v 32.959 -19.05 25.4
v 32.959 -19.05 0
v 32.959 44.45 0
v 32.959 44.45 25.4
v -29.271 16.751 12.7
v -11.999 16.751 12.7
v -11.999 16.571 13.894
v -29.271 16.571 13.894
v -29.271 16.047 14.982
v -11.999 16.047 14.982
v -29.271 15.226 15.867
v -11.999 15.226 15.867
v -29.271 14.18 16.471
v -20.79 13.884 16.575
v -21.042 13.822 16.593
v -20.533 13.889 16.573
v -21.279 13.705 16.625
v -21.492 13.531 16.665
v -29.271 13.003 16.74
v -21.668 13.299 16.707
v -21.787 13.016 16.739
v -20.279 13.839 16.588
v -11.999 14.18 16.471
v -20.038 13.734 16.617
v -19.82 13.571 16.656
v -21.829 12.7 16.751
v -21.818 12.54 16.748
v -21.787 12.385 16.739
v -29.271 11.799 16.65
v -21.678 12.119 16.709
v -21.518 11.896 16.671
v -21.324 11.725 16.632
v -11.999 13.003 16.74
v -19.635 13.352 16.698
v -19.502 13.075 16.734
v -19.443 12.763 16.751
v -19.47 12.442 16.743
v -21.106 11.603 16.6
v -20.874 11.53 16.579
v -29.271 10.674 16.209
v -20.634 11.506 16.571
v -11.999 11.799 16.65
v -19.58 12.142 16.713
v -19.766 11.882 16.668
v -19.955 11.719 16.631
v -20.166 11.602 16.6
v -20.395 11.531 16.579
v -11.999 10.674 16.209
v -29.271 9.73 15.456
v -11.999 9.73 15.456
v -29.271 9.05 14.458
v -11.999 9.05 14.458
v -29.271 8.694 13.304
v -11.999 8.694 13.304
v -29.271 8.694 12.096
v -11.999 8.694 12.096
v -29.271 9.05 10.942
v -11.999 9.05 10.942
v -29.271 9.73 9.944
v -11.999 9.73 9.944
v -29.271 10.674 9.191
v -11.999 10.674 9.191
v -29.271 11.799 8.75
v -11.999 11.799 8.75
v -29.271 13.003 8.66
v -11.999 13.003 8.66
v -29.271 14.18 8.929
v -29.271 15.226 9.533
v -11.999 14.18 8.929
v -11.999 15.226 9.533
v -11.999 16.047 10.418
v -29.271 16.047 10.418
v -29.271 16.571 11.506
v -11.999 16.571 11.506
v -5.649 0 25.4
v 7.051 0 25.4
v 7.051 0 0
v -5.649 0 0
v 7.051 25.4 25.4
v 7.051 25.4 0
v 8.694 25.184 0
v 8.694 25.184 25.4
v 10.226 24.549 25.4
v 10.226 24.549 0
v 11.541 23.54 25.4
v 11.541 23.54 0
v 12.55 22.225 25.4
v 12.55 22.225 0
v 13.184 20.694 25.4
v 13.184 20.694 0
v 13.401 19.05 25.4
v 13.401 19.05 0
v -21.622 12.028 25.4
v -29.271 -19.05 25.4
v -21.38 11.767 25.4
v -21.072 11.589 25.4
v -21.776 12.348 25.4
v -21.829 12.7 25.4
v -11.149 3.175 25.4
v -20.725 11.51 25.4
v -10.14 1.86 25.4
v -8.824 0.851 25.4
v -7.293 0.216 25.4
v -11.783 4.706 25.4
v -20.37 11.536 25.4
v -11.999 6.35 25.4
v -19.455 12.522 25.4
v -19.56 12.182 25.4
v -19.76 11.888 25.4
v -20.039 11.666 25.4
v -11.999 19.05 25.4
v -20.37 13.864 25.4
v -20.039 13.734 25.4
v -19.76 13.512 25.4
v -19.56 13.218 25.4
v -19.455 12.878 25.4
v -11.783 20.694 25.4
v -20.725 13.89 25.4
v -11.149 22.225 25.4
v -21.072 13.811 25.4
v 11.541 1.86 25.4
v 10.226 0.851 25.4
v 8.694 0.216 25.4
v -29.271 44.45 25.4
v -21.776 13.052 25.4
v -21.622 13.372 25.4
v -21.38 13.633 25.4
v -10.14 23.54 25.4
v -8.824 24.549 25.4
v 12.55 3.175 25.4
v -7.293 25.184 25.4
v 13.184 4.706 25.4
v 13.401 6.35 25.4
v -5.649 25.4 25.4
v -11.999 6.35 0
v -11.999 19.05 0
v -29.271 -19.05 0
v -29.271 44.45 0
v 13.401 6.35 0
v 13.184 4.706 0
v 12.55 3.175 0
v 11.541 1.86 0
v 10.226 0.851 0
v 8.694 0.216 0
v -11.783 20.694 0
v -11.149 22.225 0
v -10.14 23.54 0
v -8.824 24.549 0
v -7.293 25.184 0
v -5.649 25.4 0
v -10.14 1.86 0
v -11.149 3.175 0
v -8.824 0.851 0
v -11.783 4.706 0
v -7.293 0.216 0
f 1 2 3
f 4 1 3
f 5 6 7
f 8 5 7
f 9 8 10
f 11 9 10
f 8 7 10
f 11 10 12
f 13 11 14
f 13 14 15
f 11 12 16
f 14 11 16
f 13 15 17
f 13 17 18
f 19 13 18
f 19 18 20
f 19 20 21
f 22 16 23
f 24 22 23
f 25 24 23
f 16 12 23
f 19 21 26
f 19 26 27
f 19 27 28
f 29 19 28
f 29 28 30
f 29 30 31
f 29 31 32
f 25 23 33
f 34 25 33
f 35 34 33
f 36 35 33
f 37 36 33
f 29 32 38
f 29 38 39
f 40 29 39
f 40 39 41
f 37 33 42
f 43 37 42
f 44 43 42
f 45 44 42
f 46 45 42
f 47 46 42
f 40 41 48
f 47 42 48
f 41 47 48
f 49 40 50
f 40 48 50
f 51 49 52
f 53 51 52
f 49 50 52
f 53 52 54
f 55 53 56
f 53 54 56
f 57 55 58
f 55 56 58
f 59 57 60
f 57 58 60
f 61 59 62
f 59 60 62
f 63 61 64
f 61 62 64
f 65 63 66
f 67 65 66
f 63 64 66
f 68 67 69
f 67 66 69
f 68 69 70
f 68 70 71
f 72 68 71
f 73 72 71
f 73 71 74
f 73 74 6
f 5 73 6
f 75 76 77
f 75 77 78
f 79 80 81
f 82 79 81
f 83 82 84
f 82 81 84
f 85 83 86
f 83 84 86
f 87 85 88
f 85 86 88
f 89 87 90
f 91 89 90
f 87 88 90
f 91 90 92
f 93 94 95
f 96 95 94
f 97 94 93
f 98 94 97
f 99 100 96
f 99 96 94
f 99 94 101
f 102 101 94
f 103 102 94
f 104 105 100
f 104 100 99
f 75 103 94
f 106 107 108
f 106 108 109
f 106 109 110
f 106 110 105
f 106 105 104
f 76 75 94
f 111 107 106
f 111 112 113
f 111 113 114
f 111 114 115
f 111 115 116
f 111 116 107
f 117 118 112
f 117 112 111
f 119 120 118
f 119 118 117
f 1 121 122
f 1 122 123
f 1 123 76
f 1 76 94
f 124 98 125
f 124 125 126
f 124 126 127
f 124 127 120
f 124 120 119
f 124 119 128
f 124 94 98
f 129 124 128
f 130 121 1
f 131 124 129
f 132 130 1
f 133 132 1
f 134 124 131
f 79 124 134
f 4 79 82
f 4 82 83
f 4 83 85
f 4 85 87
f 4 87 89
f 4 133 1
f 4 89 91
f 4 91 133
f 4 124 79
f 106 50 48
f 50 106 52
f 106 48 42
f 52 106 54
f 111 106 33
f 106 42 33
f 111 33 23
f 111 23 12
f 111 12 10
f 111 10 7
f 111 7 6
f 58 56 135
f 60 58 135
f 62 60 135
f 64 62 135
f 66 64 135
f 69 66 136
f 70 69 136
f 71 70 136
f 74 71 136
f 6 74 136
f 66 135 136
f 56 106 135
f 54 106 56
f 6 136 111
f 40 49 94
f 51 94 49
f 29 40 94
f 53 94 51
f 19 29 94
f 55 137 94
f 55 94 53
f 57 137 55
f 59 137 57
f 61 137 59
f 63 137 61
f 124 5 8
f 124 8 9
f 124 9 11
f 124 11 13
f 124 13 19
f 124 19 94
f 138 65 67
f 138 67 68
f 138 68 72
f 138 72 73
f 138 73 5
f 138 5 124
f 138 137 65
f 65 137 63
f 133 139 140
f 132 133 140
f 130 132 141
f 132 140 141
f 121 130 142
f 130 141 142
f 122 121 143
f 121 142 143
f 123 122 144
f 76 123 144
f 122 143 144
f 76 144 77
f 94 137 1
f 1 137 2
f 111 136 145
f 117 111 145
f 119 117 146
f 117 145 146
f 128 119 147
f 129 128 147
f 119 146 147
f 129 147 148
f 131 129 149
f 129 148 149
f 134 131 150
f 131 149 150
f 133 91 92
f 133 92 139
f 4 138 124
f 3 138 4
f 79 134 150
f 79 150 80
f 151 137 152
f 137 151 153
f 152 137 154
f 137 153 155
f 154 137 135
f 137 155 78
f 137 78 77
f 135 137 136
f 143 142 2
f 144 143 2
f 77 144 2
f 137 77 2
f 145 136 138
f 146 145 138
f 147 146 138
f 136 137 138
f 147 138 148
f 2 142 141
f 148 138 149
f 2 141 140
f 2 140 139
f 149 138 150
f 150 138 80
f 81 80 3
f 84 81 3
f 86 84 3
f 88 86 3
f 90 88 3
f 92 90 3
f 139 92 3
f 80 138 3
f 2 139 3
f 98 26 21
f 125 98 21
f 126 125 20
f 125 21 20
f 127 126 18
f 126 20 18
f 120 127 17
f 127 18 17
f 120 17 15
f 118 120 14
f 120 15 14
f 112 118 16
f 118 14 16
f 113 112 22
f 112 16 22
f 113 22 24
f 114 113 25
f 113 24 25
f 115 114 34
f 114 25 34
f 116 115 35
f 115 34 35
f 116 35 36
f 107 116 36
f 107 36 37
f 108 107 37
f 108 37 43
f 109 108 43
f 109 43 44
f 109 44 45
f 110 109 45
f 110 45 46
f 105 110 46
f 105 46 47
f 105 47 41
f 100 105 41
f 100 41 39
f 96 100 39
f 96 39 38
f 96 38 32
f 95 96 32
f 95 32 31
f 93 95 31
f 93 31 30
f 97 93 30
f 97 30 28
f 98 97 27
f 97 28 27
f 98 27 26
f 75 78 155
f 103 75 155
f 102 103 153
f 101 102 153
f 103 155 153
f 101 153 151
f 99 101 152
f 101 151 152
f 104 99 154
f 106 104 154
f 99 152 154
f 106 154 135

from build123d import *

# Parameters (mm, degrees)
F0_W     = 62.23
F0_H     = 63.5
F1_DEPTH = 25.4
F3_D     = 8.1026
F3_DEPTH = 20.32
F5_D     = 2.3876
F5_DEPTH = 12.7


with BuildPart() as f1:
    # F0 (on Top) → F1 (new body)
    with BuildSketch(Plane.XY):
        with Locations((1.843547, 12.7)):
            Rectangle(F0_W, F0_H)
        with BuildLine():
            ThreePointArc((-11.999453, 19.05), (-10.139581, 23.540128), (-5.649453, 25.4))
            Line((-5.649453, 25.4), (7.050547, 25.4))
            ThreePointArc((7.050547, 25.4), (11.540676, 23.540128), (13.400547, 19.05))
            Line((13.400547, 19.05), (13.400547, 6.35))
            ThreePointArc((13.400547, 6.35), (11.540676, 1.859872), (7.050547, 0))
            Line((7.050547, 0), (-5.649453, 0))
            ThreePointArc((-5.649453, 0), (-10.139581, 1.859872), (-11.999453, 6.35))
            Line((-11.999453, 6.35), (-11.999453, 19.05))
        make_face(mode=Mode.SUBTRACT)
    extrude(amount=F1_DEPTH)

    # F3
    with Locations(Plane(origin=(-29.271453, 0, 0), x_dir=(0, -1, 0), z_dir=(-1, 0, 0))):
        with Locations((-12.7, 12.7)):
            Hole(F3_D / 2, depth=F3_DEPTH)

    # F5
    with Locations(Plane.XY.offset(25.4)):
        with Locations((-20.635453, 12.7)):
            Hole(F5_D / 2, depth=F5_DEPTH)


solid = f1.part
